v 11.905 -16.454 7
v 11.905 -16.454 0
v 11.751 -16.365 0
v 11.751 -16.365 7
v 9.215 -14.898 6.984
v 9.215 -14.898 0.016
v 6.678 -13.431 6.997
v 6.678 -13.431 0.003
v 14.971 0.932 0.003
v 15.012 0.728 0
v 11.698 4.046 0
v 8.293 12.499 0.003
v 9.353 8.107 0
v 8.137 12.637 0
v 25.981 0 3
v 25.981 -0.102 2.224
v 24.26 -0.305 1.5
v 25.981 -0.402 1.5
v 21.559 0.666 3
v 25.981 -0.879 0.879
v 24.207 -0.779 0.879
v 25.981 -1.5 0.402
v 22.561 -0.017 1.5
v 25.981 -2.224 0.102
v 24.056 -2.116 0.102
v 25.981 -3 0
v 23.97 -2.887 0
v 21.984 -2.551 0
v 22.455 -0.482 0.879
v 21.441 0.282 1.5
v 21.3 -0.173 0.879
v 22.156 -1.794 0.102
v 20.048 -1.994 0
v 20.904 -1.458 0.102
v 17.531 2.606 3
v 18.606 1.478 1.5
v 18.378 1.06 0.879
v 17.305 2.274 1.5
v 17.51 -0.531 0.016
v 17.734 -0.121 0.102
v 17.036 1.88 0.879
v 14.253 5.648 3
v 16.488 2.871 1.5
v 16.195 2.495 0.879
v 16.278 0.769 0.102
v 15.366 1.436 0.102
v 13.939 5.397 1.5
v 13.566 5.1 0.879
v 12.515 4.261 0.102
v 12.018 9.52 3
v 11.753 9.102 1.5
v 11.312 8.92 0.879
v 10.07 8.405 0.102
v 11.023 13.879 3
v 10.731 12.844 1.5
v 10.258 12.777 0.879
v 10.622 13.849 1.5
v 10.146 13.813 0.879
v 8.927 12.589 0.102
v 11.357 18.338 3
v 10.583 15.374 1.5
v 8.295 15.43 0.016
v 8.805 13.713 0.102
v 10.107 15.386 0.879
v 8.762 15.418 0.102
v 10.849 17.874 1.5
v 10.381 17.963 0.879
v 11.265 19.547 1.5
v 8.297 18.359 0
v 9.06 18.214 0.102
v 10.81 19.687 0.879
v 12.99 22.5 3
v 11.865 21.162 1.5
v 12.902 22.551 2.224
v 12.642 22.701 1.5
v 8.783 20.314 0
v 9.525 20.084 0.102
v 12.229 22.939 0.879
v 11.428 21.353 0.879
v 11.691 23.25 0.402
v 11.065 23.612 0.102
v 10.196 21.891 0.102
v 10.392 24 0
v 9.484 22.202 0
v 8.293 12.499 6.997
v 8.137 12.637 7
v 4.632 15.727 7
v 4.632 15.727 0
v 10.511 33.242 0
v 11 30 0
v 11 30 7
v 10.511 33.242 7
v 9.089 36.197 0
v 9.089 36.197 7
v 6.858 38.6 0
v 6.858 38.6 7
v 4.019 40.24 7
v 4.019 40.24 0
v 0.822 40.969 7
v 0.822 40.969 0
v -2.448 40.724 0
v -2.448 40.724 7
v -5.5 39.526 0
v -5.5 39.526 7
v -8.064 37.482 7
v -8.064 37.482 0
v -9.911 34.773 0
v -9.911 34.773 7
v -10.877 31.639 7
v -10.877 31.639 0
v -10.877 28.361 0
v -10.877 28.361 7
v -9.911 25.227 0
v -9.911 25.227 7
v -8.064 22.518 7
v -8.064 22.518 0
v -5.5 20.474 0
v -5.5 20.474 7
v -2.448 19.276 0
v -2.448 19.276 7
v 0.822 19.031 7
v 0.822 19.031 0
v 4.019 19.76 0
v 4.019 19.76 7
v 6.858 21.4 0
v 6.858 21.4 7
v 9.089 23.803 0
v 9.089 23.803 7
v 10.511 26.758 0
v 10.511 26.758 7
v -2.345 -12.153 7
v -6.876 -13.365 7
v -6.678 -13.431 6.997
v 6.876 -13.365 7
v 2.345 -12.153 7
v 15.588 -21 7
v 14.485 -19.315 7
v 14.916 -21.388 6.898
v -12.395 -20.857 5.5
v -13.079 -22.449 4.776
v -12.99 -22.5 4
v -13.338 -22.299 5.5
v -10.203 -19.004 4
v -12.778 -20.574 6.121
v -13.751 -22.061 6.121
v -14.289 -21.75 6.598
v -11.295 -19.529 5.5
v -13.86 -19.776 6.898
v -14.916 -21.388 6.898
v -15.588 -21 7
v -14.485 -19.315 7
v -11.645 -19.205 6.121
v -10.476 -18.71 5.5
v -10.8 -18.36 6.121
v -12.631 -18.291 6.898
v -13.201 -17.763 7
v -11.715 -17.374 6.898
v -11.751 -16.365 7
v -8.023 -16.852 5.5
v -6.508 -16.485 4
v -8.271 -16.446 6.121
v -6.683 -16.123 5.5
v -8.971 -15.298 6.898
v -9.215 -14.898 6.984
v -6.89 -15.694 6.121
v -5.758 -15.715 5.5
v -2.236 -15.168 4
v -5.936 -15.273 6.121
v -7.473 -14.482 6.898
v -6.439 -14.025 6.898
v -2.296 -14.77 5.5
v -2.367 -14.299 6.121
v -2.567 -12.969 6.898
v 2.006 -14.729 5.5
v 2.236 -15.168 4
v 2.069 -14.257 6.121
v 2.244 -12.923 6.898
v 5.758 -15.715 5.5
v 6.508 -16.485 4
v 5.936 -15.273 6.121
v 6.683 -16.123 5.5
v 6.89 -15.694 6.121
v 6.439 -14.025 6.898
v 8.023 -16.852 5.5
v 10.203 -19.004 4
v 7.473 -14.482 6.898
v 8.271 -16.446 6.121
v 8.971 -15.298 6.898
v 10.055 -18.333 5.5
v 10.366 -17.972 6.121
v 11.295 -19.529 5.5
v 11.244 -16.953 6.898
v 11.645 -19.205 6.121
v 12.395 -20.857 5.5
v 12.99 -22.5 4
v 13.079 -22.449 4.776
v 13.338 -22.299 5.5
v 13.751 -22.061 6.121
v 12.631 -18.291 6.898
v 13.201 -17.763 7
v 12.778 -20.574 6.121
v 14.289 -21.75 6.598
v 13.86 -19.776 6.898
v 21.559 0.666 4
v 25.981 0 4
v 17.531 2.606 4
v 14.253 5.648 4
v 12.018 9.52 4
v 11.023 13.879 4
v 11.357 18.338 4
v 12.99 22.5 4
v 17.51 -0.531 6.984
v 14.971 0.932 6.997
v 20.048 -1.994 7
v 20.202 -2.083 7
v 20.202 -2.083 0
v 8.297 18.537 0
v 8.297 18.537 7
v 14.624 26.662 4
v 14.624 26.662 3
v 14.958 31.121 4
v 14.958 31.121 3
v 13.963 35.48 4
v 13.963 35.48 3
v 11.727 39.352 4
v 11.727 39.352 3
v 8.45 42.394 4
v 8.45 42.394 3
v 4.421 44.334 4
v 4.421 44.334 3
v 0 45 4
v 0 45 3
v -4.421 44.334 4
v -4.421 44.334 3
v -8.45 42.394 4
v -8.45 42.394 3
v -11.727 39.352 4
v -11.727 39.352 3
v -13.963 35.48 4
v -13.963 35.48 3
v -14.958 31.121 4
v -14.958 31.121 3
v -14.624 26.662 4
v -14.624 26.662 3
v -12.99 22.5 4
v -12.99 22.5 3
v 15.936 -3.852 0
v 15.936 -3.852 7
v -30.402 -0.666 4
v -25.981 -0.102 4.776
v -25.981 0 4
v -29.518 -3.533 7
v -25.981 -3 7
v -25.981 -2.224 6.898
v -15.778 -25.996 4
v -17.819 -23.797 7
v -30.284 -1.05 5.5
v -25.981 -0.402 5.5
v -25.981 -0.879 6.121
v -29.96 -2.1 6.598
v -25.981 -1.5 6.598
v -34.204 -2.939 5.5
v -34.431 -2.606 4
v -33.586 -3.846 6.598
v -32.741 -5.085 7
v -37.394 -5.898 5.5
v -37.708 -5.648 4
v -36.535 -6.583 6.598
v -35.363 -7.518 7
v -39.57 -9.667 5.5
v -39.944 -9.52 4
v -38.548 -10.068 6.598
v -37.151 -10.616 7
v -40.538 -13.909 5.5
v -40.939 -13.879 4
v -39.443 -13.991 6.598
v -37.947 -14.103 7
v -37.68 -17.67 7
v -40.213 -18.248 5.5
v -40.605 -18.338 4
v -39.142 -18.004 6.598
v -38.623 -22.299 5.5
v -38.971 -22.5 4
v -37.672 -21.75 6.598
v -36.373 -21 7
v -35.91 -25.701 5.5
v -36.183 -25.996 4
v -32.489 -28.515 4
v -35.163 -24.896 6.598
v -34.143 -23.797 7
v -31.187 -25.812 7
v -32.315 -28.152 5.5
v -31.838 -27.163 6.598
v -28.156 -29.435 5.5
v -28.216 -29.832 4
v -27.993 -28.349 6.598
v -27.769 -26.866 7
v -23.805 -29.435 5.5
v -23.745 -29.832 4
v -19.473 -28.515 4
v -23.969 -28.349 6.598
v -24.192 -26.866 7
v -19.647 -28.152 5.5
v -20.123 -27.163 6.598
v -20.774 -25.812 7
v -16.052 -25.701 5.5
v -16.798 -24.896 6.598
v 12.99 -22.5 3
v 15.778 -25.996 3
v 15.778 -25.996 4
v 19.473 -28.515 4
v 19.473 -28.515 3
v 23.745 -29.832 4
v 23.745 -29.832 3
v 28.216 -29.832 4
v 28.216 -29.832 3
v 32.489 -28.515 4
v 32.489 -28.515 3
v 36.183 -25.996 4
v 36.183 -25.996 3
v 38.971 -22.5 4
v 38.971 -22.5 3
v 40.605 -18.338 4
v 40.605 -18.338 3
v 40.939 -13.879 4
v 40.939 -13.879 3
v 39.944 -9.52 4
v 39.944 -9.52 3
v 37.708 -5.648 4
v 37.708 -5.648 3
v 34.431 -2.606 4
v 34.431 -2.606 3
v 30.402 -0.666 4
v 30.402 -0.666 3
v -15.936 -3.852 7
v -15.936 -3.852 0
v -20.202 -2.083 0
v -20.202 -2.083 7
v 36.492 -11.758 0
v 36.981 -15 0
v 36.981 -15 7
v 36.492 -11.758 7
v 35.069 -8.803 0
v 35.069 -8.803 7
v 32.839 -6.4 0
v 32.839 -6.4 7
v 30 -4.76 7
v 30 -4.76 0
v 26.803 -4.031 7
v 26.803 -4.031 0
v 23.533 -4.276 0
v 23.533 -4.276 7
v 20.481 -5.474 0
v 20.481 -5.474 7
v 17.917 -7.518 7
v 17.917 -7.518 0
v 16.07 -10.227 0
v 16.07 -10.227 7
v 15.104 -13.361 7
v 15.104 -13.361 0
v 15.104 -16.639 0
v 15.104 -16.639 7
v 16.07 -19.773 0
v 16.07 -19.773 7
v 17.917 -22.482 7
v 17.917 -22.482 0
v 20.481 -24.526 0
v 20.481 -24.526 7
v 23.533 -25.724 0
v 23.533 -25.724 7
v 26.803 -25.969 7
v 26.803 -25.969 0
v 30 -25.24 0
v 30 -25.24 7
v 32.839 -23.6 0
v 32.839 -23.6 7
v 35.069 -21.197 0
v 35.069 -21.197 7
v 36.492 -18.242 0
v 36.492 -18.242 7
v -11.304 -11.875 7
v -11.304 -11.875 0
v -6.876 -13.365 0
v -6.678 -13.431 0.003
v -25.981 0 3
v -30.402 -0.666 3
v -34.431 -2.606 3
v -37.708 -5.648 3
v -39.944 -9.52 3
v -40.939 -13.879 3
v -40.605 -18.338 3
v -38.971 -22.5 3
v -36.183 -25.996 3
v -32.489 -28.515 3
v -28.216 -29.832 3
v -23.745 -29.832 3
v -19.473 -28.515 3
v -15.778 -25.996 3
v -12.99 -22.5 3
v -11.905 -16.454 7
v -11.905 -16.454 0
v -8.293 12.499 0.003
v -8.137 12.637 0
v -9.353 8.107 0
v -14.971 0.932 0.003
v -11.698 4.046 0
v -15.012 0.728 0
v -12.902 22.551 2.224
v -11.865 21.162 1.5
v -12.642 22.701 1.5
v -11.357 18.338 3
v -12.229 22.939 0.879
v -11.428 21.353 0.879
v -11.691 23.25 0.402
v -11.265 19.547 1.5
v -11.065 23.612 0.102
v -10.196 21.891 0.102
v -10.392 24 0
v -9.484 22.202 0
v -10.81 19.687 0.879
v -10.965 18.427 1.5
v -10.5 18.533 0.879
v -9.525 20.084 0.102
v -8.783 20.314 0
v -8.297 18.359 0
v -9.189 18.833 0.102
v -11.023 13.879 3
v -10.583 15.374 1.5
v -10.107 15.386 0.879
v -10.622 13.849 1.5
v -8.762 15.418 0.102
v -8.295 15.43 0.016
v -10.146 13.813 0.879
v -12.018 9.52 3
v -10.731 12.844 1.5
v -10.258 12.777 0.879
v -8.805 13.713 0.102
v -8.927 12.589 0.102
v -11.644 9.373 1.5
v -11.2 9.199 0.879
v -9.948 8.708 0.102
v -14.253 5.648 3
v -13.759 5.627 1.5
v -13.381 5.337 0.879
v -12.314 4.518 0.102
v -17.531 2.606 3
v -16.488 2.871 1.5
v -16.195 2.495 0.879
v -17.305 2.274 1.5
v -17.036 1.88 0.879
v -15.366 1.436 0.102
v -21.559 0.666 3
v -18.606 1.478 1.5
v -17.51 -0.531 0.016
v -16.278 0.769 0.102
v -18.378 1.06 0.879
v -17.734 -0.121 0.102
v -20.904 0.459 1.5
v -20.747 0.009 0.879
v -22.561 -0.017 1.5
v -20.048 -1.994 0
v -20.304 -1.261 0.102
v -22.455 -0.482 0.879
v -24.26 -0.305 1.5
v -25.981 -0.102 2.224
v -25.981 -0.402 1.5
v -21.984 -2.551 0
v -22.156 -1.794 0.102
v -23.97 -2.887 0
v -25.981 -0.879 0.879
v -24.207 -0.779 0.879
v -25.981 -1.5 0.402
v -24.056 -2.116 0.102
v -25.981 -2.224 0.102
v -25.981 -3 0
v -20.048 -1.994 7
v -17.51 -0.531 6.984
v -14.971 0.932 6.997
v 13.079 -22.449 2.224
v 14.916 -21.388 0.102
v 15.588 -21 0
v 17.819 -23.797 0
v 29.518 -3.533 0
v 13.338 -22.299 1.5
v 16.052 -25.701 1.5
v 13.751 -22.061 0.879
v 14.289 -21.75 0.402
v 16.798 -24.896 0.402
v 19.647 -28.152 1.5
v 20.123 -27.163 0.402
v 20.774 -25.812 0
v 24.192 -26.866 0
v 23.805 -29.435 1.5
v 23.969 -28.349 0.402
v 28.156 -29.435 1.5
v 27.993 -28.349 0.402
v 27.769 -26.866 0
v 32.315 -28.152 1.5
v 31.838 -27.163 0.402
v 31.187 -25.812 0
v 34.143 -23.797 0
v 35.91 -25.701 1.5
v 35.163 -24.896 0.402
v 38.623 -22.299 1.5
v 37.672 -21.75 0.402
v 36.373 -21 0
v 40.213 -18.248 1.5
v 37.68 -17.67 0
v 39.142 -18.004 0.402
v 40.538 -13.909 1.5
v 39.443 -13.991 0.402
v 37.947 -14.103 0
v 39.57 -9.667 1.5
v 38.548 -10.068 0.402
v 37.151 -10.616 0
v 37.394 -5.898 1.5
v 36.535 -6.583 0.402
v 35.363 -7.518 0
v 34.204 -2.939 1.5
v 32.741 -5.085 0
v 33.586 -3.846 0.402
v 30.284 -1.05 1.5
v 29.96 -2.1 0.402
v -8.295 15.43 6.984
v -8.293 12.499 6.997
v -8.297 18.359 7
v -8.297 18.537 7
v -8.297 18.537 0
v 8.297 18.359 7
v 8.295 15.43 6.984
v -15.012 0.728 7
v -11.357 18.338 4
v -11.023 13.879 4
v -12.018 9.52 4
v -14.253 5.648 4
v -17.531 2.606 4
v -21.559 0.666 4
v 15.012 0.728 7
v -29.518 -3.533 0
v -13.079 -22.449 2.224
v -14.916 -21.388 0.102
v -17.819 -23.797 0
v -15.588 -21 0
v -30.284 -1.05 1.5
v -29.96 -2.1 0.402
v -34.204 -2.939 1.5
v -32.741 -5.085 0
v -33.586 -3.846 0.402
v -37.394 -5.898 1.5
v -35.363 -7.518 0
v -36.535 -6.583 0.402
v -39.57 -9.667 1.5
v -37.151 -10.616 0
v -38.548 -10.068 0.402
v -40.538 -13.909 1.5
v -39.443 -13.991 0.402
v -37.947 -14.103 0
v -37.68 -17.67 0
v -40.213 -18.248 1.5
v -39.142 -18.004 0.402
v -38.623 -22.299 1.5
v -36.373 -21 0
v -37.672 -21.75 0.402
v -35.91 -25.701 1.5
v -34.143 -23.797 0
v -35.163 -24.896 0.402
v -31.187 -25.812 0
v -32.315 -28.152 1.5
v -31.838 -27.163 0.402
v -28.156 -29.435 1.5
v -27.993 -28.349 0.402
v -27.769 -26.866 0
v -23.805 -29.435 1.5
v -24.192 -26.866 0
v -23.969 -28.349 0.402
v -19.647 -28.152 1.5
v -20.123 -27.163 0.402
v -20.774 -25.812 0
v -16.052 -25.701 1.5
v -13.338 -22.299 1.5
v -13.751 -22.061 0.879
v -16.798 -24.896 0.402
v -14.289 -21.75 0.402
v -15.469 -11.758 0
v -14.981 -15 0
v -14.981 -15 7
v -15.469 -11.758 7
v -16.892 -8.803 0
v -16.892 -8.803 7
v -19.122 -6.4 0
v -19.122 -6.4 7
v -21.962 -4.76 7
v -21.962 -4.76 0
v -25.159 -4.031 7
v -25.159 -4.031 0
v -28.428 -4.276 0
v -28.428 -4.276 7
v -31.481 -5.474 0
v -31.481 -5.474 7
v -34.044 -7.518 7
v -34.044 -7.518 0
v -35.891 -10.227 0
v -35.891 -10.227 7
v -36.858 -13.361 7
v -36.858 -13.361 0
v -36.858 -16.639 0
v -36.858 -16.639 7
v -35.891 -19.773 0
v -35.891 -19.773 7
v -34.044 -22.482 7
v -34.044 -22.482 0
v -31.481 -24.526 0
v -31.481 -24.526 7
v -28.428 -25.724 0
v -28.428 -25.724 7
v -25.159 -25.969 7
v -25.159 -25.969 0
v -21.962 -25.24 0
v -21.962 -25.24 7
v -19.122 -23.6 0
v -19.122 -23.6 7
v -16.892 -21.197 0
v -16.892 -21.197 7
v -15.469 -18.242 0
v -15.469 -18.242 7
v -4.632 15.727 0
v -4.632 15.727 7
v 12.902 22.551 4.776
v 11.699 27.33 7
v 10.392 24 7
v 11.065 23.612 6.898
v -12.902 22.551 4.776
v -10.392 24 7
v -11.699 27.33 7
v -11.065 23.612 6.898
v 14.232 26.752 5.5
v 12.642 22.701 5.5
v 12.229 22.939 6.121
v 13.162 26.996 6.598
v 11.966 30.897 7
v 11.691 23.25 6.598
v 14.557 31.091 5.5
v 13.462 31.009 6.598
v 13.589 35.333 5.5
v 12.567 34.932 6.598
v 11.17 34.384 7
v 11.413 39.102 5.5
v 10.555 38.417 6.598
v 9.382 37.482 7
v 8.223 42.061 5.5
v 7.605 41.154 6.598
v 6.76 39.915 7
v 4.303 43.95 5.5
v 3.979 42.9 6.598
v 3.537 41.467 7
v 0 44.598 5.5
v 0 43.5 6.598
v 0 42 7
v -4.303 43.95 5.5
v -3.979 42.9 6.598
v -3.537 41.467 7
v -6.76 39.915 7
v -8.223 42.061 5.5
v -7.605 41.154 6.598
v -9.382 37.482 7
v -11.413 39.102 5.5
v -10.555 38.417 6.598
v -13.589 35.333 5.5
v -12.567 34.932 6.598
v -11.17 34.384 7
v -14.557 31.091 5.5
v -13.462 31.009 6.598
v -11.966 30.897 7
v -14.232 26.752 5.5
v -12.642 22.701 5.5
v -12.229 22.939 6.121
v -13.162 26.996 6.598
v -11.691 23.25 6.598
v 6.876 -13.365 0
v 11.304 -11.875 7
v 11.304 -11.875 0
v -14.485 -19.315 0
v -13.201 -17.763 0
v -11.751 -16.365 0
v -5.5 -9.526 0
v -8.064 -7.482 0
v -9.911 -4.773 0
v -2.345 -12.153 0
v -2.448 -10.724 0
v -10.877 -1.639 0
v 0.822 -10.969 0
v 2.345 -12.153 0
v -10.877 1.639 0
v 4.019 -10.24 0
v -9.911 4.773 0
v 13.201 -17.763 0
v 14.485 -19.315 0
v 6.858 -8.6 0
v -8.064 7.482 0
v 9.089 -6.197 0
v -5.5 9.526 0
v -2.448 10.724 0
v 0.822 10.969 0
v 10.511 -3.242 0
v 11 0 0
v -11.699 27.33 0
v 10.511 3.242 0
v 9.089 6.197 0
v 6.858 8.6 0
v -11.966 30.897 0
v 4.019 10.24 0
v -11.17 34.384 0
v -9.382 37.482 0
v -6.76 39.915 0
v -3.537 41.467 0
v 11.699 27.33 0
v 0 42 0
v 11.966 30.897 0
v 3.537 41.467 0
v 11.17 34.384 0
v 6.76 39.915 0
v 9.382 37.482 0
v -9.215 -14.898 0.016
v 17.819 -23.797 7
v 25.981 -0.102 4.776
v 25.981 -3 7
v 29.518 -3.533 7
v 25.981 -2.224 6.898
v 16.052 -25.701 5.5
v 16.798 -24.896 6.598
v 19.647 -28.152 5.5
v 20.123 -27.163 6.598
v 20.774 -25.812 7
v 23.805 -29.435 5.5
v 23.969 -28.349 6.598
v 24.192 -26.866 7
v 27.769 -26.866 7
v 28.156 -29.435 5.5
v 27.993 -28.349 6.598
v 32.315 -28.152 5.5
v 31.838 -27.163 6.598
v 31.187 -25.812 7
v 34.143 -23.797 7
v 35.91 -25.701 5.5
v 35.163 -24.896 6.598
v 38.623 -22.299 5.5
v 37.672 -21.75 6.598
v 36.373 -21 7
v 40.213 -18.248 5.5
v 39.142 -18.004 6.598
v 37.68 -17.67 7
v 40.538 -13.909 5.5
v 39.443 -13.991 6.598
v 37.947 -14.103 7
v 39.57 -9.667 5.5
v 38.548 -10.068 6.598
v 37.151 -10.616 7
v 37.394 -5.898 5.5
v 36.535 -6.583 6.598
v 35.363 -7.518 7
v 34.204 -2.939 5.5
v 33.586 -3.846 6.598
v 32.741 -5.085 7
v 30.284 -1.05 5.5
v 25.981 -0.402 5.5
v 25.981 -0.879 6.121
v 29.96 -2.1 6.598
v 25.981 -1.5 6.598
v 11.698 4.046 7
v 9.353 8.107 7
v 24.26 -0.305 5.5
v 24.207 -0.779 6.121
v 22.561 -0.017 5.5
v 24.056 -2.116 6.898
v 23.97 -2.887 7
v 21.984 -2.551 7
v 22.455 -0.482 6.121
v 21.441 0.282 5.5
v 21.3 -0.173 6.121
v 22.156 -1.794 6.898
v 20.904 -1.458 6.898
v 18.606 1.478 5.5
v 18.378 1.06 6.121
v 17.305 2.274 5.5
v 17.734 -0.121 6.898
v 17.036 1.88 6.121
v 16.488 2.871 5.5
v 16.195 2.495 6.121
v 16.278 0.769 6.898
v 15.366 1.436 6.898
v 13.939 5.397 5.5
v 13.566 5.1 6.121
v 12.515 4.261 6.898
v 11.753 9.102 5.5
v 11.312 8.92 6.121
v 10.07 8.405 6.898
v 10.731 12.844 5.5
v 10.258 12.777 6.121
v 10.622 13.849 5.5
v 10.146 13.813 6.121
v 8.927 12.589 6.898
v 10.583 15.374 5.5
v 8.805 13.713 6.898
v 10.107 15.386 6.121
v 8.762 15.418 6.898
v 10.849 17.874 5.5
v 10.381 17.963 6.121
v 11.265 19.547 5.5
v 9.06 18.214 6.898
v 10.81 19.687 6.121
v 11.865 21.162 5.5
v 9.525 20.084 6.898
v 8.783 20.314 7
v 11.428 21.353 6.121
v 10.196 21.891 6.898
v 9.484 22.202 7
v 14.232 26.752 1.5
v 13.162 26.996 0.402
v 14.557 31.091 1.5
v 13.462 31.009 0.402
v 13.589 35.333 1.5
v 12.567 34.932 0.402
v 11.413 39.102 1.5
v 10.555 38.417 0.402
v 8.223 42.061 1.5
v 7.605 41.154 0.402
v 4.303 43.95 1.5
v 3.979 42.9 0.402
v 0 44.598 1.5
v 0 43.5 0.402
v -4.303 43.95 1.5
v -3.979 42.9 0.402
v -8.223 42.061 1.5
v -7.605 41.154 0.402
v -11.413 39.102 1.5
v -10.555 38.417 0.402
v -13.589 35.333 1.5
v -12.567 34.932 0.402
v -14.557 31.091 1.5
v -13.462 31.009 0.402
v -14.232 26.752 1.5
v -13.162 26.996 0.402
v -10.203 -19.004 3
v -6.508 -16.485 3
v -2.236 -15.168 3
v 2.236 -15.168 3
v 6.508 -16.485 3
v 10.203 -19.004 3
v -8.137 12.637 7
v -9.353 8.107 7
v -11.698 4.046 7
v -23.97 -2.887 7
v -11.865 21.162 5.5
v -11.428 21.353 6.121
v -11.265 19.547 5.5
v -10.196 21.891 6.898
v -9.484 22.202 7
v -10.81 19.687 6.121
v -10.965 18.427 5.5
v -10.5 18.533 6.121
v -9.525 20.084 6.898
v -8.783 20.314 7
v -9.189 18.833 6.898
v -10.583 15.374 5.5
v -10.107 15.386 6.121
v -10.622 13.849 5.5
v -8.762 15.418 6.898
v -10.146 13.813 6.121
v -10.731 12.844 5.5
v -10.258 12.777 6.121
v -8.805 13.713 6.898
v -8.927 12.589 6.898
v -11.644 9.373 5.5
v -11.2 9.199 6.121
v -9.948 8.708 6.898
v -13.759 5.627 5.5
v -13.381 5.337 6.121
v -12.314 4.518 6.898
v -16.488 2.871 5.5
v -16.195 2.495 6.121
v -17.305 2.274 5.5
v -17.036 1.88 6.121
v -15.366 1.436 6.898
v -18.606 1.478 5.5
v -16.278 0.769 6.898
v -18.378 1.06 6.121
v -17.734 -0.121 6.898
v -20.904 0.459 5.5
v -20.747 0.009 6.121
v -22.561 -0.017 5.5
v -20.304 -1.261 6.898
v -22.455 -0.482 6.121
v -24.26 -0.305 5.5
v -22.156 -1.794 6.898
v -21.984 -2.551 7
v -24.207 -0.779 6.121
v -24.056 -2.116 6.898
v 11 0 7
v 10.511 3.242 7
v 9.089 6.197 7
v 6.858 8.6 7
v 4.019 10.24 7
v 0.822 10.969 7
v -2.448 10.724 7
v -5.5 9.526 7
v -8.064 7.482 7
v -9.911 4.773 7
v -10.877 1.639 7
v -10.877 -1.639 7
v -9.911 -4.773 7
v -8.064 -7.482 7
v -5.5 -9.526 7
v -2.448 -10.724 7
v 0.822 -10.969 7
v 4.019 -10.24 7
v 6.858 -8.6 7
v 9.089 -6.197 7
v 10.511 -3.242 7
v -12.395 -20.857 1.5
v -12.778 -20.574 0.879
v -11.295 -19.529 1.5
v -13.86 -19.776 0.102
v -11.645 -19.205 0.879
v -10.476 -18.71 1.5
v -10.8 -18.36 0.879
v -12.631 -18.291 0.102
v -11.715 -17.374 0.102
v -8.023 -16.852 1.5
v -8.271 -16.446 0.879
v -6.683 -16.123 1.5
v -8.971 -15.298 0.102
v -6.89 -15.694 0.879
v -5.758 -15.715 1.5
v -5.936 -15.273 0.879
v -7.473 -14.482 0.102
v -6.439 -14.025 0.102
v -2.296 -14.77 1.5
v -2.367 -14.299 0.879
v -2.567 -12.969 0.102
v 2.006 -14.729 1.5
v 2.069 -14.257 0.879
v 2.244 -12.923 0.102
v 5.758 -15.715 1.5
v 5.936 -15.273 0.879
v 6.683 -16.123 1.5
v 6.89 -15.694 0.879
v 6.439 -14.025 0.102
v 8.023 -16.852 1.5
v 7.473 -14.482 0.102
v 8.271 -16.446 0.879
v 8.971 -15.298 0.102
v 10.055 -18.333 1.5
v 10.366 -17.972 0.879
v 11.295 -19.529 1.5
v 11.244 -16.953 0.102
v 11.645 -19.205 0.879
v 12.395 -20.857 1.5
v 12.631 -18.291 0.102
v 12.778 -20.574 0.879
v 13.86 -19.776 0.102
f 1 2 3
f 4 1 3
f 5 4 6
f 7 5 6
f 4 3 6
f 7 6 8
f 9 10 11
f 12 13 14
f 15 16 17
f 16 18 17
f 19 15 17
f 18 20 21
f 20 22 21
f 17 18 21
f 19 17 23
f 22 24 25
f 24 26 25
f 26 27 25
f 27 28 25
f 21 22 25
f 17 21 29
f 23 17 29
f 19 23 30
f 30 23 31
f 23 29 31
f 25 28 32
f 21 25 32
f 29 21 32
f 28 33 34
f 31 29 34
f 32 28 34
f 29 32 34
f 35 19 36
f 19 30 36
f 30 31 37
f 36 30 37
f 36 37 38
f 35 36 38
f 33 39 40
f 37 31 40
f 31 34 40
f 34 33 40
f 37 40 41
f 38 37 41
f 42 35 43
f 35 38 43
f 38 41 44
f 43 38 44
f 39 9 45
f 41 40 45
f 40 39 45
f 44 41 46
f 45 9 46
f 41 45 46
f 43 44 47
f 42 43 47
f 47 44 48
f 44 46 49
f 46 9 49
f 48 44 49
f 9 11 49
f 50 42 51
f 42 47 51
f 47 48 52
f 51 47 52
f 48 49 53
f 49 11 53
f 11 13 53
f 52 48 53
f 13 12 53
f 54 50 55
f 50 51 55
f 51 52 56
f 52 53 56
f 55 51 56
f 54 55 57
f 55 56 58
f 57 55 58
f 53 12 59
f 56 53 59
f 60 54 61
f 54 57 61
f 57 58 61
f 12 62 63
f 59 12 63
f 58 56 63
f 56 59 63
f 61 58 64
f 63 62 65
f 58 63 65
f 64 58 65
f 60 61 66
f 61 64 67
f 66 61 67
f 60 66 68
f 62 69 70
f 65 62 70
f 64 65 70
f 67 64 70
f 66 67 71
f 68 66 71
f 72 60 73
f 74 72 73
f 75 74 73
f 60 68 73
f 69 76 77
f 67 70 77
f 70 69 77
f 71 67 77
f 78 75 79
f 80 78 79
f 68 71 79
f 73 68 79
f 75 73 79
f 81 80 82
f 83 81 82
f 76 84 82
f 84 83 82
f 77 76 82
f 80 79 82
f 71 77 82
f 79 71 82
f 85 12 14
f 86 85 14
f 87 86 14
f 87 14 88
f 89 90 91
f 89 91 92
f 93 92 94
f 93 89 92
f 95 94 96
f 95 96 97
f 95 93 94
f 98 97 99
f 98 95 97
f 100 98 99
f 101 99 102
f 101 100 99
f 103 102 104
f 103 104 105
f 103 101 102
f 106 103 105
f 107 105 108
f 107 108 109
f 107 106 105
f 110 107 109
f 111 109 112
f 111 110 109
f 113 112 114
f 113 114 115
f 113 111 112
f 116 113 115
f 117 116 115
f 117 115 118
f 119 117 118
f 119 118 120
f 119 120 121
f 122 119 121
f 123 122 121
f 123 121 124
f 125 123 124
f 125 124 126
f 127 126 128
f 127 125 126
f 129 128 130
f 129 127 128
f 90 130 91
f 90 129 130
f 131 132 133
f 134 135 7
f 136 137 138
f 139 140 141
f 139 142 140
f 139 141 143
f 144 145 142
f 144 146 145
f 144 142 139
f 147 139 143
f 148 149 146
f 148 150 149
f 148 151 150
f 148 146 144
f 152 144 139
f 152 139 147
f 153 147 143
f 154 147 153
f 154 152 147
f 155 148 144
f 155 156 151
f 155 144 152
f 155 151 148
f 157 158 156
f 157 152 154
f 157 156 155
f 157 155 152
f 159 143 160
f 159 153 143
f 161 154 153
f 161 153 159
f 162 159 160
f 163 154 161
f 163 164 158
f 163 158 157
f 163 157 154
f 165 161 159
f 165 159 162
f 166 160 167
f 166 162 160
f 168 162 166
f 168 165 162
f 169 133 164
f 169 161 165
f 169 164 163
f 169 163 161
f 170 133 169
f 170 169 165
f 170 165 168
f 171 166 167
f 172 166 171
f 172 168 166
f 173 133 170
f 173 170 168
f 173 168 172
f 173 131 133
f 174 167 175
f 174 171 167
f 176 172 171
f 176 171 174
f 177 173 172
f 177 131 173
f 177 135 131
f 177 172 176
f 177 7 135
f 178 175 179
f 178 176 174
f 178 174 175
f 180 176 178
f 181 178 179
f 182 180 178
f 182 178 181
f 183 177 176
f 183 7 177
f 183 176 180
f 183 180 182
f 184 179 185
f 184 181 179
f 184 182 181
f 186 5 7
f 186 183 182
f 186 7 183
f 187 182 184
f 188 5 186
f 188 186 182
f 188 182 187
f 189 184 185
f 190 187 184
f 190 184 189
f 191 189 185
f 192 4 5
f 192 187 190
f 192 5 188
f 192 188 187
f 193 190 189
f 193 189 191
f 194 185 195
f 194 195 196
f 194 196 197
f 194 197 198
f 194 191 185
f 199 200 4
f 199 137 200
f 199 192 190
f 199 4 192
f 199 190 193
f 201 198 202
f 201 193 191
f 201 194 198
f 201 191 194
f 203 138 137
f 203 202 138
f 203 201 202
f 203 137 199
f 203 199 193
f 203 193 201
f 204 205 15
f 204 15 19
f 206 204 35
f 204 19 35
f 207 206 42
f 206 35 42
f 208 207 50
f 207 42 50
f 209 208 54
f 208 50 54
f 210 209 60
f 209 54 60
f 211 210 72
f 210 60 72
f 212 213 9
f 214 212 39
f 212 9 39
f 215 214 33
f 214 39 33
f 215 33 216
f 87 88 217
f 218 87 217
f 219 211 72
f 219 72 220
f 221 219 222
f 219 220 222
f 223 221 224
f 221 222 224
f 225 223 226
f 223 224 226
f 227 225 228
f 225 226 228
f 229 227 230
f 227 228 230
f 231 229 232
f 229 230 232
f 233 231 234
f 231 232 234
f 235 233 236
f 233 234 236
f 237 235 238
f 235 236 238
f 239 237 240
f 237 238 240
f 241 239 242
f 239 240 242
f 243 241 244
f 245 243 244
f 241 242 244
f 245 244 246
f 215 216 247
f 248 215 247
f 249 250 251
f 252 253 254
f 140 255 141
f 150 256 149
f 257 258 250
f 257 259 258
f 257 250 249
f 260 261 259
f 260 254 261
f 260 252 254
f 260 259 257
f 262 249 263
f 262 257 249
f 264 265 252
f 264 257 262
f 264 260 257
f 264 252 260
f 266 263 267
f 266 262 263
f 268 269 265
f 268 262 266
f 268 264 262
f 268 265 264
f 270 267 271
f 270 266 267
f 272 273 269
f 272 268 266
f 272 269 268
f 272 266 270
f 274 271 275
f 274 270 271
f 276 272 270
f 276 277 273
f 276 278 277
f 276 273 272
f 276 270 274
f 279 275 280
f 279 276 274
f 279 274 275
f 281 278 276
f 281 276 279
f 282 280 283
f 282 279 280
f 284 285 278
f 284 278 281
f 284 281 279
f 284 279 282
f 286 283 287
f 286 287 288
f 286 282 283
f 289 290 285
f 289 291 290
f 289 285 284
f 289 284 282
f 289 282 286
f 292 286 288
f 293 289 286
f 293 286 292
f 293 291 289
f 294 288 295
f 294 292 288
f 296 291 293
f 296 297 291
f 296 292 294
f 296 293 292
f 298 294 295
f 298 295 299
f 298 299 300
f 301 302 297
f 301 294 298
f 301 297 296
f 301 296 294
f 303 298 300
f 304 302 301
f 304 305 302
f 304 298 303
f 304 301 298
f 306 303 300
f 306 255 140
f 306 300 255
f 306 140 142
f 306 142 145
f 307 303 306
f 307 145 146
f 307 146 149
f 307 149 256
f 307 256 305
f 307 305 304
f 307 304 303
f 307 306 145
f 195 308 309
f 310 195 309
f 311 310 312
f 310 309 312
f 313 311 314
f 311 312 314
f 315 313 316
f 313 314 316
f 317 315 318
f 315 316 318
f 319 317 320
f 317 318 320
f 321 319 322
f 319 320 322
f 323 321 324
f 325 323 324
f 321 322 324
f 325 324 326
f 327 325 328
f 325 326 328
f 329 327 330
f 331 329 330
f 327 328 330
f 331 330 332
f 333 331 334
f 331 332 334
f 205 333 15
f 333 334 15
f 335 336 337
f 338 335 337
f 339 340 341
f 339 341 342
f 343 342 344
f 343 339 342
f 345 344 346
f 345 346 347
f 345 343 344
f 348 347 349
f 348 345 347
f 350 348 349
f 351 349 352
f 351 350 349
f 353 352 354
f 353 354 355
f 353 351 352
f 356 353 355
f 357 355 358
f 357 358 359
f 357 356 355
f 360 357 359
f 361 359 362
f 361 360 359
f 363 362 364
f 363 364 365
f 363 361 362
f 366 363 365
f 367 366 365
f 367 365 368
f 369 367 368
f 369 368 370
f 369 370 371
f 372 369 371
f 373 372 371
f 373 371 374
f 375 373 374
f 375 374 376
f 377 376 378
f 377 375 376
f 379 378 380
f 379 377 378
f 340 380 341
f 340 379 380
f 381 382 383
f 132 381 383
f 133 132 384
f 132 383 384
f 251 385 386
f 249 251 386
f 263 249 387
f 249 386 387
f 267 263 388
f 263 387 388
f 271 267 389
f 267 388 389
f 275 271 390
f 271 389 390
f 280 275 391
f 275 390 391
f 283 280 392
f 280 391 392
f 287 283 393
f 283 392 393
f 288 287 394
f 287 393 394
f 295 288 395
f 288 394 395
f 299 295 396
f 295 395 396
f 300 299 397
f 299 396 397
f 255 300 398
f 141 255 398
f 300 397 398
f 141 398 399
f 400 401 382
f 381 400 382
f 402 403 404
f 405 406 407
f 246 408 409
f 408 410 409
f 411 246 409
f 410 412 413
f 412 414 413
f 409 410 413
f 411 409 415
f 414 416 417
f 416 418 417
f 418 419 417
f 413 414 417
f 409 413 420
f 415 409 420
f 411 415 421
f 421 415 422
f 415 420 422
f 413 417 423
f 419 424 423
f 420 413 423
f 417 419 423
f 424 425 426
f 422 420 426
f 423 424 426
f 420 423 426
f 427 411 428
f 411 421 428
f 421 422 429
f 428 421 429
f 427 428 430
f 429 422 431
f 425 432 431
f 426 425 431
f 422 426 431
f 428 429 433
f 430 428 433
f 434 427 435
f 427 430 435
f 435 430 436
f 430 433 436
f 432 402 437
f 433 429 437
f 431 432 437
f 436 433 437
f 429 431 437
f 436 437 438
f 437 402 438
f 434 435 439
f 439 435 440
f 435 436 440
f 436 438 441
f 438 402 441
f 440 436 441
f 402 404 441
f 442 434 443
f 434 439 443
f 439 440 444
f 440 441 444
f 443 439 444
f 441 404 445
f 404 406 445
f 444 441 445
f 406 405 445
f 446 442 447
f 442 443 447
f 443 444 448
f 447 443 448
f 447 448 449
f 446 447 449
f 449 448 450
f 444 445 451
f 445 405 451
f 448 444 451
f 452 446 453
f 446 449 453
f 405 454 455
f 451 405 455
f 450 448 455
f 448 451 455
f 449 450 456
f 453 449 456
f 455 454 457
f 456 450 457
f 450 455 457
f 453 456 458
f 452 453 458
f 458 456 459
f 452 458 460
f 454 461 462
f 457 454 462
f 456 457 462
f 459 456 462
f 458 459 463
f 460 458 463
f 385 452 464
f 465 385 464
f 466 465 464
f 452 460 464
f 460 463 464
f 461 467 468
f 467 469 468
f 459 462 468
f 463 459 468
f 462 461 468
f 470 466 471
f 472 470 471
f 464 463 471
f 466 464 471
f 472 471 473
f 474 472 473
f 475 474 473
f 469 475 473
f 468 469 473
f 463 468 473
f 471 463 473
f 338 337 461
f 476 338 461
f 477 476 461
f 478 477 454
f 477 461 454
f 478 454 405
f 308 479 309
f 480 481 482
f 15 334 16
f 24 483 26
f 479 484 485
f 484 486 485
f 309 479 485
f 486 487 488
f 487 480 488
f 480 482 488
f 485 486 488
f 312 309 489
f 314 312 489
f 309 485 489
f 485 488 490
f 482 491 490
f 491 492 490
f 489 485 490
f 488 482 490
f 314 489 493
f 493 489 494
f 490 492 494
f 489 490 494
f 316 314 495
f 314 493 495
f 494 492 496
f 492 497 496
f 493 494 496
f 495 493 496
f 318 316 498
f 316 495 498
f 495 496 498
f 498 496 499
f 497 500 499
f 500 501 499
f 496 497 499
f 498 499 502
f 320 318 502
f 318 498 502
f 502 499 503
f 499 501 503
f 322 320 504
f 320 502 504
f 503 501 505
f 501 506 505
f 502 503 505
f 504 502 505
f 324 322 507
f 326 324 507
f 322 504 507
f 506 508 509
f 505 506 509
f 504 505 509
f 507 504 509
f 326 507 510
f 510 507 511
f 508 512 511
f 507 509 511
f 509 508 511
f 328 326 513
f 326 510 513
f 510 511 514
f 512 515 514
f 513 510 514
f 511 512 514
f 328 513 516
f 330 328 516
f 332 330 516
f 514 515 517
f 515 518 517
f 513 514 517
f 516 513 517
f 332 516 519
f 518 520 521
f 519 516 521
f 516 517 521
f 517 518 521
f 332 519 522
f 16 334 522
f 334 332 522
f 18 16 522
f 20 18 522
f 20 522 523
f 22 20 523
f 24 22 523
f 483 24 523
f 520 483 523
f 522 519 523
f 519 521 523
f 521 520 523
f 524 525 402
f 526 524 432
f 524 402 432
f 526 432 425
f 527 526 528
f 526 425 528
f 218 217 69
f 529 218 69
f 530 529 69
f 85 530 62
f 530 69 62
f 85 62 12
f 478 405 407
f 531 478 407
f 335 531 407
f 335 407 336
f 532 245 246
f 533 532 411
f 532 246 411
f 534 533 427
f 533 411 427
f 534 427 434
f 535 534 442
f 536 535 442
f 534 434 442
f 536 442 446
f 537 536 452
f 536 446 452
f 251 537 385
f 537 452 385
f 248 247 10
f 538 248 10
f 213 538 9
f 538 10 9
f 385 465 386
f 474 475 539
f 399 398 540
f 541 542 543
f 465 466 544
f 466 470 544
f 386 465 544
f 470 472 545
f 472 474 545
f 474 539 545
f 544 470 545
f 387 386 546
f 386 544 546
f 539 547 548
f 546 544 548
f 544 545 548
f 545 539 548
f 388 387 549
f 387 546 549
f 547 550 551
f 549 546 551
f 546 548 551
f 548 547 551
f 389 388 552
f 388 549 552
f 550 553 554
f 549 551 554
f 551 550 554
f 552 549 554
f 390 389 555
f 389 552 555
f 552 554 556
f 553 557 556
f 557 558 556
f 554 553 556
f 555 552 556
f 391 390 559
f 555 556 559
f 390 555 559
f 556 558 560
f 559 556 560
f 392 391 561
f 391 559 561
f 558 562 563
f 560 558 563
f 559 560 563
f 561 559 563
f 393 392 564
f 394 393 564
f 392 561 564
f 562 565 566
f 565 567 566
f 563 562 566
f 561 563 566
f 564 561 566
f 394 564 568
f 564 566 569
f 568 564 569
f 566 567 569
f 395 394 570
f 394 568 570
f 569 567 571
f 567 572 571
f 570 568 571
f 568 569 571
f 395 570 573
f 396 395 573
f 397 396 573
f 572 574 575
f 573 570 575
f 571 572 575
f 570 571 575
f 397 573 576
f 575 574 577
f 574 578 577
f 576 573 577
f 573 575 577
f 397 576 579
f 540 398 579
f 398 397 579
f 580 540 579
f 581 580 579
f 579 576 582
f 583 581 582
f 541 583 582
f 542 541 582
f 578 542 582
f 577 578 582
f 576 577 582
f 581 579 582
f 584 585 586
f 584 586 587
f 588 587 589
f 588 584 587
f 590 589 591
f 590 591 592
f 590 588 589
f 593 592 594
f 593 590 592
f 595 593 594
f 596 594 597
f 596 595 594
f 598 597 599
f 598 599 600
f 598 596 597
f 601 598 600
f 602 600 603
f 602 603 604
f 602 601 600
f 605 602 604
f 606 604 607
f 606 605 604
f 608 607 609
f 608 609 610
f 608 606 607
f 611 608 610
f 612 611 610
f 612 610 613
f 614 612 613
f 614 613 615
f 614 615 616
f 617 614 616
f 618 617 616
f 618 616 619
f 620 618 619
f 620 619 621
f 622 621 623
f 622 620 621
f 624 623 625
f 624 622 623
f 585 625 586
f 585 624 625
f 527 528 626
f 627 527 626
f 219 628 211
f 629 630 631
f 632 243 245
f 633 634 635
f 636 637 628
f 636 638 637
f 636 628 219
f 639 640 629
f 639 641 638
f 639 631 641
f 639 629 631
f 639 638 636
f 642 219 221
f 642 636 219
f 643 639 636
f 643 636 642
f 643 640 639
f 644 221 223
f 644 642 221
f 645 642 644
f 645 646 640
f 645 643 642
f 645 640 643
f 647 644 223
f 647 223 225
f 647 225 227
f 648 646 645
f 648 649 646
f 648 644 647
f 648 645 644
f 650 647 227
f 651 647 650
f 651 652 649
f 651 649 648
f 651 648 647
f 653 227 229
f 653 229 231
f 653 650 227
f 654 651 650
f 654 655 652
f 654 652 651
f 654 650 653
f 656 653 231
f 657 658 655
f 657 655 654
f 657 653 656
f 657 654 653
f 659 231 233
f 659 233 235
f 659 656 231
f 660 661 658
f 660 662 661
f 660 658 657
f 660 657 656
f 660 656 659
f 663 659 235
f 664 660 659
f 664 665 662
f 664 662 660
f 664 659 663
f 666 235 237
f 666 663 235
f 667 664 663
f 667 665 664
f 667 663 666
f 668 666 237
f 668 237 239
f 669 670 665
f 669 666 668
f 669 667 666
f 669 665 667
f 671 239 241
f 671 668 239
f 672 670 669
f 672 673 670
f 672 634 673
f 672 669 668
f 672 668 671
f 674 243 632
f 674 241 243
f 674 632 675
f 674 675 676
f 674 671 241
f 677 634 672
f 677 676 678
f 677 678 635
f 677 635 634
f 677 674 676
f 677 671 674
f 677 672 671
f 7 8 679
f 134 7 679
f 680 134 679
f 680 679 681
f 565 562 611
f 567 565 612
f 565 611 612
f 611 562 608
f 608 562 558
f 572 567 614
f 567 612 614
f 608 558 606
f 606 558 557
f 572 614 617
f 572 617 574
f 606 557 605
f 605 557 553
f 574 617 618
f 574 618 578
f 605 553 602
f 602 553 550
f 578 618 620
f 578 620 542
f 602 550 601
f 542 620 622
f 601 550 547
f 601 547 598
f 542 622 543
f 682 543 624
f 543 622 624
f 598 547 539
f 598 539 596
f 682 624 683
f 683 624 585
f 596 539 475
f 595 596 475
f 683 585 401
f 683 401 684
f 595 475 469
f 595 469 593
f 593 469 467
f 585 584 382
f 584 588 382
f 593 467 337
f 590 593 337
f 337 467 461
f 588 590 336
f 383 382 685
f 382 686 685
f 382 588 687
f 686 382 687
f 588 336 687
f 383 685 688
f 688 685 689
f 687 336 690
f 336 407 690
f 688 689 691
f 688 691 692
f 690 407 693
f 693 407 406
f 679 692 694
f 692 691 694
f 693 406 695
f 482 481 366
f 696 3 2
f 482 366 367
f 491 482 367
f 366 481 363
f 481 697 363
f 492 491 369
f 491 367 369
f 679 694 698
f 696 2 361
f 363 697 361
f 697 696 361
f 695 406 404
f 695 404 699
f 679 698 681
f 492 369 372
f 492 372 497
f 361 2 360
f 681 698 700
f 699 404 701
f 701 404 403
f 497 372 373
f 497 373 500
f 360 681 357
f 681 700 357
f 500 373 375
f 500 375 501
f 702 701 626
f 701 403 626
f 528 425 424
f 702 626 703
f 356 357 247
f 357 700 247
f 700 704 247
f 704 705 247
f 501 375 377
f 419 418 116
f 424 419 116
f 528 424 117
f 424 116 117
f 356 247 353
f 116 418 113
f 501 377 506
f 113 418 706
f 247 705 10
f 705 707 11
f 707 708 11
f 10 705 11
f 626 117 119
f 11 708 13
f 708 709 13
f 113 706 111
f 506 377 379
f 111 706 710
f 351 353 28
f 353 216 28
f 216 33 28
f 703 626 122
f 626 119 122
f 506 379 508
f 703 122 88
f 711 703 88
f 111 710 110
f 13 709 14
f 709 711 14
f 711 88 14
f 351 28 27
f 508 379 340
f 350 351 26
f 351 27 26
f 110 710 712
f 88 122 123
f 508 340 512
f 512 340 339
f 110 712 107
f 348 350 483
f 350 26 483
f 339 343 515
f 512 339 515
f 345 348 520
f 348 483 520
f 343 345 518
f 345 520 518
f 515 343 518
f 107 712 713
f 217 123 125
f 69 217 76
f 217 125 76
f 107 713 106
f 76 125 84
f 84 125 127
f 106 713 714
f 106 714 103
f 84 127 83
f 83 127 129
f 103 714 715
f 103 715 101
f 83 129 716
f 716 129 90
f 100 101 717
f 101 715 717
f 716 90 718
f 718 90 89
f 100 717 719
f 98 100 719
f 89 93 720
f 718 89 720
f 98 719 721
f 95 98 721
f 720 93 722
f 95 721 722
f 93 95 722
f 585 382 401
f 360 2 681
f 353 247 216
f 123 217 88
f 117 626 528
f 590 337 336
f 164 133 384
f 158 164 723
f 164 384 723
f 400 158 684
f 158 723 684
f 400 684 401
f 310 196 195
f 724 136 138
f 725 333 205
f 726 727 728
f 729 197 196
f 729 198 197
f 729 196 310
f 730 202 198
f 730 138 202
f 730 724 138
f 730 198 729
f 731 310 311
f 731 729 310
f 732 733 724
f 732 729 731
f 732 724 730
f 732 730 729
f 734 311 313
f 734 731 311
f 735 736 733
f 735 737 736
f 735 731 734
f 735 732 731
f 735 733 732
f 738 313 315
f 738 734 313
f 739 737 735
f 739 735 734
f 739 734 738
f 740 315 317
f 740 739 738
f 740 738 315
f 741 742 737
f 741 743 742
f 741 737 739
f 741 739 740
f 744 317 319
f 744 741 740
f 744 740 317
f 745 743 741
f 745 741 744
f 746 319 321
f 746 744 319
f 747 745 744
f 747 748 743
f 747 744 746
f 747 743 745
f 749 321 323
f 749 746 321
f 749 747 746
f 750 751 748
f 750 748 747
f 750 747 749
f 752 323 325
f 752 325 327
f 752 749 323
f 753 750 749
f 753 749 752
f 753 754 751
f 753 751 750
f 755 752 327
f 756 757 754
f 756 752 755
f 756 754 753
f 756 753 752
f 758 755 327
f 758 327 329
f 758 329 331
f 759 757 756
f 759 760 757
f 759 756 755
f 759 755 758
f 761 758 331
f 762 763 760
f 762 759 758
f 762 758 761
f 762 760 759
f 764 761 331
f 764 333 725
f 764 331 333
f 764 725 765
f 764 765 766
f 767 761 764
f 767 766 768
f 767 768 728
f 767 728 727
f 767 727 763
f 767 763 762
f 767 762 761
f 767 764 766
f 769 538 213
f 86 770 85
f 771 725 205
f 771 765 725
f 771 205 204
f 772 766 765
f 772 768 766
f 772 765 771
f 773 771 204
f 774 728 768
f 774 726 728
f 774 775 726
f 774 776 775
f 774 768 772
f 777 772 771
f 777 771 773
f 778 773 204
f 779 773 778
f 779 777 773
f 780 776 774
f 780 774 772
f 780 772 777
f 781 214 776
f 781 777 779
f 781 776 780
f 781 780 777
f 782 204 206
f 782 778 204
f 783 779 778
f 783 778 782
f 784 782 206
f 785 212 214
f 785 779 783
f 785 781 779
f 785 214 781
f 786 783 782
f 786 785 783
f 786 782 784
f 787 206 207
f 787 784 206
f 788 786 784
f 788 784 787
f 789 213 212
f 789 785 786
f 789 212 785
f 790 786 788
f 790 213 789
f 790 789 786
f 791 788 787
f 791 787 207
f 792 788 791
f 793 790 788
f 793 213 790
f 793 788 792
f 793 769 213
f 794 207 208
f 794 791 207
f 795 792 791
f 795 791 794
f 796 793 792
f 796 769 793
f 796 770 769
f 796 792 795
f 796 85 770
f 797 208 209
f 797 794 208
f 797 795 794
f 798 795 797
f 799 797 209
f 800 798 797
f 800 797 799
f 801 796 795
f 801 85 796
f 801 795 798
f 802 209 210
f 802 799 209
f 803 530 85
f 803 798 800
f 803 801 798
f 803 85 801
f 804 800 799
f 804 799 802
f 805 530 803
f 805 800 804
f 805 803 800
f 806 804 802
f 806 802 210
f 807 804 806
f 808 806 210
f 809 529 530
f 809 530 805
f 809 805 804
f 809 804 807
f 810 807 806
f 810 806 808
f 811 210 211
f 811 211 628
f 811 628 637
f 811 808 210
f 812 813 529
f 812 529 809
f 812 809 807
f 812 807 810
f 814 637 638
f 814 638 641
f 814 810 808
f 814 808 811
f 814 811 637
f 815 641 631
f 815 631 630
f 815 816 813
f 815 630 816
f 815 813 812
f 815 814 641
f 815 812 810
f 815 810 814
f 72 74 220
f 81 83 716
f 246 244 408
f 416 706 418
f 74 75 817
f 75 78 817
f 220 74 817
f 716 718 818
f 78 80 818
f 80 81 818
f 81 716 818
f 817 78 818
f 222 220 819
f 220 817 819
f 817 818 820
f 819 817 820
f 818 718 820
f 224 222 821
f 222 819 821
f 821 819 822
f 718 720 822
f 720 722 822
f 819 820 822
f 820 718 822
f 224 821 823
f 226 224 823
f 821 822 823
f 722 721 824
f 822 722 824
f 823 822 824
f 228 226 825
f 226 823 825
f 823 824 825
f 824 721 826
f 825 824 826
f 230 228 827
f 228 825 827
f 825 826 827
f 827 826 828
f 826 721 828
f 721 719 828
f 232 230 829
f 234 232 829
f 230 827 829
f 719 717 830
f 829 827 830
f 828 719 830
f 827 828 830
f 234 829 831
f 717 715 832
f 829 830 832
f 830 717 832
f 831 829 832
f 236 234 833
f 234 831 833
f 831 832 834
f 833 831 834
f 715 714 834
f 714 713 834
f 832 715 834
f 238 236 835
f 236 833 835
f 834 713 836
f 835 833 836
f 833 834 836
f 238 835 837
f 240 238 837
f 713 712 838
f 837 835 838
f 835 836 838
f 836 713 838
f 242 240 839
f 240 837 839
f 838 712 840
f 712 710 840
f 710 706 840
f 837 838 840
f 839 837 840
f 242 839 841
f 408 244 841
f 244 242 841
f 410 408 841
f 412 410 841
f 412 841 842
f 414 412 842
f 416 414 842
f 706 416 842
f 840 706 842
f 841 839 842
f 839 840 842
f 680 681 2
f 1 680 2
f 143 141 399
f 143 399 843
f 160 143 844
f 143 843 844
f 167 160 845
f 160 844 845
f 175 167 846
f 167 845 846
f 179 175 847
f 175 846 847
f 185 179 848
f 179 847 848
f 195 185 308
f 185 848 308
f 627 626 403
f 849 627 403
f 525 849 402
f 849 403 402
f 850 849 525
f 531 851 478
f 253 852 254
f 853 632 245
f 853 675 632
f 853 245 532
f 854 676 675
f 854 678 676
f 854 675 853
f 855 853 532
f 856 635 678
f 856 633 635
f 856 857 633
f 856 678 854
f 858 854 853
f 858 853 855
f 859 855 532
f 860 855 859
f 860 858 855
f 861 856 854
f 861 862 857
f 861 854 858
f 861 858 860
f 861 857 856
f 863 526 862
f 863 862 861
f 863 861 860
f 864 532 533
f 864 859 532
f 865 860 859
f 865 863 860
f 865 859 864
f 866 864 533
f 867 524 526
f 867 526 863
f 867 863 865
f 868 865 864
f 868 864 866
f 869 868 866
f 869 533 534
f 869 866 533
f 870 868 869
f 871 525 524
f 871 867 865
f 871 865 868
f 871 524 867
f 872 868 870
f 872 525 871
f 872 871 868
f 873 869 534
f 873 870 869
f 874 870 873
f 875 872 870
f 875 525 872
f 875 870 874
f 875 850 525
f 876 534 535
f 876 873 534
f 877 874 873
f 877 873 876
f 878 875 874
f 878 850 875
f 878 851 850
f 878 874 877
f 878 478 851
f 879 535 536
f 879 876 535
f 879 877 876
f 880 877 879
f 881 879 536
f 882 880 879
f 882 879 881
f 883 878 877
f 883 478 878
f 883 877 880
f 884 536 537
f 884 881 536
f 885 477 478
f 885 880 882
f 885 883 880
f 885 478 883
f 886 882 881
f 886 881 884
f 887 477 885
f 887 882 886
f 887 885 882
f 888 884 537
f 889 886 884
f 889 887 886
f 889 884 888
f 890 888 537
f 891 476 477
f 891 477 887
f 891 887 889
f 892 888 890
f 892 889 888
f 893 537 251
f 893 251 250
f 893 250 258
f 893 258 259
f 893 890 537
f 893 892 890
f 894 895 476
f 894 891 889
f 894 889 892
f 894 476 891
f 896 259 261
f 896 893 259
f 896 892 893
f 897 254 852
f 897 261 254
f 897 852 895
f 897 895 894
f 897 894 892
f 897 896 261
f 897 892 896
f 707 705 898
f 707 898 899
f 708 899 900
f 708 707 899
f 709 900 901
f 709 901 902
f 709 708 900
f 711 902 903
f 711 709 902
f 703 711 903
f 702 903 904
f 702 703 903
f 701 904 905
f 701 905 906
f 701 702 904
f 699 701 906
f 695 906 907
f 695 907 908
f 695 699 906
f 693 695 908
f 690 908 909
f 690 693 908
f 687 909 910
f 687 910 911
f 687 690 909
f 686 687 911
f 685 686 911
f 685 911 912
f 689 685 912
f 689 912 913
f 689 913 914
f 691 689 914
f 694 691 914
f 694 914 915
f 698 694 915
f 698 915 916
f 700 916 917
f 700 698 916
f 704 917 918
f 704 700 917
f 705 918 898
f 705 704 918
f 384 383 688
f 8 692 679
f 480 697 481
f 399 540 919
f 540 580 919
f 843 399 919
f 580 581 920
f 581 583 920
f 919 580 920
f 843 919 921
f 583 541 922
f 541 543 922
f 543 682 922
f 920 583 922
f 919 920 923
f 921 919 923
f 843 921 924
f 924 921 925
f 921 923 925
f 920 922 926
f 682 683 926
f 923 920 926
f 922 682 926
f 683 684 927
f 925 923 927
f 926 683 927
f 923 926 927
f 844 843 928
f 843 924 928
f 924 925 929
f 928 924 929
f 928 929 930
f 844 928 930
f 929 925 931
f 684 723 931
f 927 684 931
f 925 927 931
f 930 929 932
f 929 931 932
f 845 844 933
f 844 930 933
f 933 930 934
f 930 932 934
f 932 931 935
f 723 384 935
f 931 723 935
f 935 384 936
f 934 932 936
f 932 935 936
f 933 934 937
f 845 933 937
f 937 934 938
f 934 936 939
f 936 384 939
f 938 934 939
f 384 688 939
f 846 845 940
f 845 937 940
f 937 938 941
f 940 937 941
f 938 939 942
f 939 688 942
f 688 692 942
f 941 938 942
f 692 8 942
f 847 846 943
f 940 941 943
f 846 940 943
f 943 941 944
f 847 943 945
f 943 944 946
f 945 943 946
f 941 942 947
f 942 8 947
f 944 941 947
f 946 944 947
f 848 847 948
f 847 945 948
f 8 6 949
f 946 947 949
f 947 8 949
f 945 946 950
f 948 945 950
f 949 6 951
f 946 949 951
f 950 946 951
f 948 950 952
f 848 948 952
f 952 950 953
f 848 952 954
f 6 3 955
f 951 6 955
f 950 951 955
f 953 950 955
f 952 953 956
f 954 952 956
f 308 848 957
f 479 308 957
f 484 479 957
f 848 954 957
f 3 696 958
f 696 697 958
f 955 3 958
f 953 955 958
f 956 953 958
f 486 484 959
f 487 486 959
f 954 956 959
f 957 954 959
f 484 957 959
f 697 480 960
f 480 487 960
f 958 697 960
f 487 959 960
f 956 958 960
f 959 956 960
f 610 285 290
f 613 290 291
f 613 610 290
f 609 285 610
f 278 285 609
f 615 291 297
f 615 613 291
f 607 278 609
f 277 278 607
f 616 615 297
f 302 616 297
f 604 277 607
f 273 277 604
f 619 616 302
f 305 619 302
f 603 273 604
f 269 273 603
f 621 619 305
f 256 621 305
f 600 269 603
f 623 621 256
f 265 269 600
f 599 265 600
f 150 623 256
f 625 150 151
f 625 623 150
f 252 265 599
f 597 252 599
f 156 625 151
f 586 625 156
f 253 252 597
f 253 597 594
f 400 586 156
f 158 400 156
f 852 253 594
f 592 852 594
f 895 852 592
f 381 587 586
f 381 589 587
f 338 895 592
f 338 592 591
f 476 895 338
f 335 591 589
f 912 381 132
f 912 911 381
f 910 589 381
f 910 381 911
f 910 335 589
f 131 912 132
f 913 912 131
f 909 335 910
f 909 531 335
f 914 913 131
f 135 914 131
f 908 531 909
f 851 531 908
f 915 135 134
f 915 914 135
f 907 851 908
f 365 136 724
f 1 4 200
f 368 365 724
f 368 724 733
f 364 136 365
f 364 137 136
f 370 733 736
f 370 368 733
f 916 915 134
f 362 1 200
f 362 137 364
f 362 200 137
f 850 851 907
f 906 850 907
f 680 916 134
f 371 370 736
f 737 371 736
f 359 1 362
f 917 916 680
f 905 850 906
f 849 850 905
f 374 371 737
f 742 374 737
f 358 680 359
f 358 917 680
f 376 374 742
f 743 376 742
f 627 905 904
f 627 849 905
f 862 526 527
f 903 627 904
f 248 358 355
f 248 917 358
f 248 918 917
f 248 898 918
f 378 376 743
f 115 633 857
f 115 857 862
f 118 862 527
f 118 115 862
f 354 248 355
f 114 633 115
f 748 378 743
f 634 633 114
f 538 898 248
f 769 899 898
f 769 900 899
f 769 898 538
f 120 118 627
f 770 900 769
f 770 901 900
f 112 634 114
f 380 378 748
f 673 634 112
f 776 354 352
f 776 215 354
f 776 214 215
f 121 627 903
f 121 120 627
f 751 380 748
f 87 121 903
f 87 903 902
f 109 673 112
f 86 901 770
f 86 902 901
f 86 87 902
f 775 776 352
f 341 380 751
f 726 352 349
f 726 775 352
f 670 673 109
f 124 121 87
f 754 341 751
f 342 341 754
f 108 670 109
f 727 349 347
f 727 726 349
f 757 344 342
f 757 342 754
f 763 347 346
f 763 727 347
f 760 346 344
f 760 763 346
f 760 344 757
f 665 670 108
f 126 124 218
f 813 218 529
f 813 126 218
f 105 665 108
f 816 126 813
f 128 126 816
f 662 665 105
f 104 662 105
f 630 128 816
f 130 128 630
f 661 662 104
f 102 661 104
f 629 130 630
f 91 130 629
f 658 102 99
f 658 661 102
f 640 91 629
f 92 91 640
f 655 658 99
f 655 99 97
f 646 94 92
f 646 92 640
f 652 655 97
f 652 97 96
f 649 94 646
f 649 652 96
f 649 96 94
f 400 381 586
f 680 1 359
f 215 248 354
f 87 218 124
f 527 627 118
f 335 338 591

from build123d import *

# Parameters (mm, degrees)
F0_R         = 11
F1_DEPTH     = 7
F2_T2_ANGLE  = 120
F2_T4_ANGLE  = 240
F2_T6_ANGLE  = 120
F2_T8_ANGLE  = 120
F2_T10_ANGLE = 240
F2_T12_ANGLE = 120
F2_T14_ANGLE = 240
F2_T16_ANGLE = 240
F2_T18_ANGLE = 120
F2_T20_ANGLE = 240
F2_T22_ANGLE = 120
F2_T24_ANGLE = 240


# Not quite as in the source:
# - a fillet or chamfer that OpenCascade refuses, or shapes differently, is made with other operations: its cross-section is extruded or revolved along the edge and cut away or added


with BuildPart() as f1:
    # F0 (on Top) → F1 (new body)
    with BuildSketch(Plane.XY):
        with BuildLine():
            ThreePointArc((25.9807621135, 0), (12.9903810568, 7.5), (12.9903810568, 22.5))
            ThreePointArc((12.9903810568, 22.5), (0, 45), (-12.9903810568, 22.5))
            ThreePointArc((-12.9903810568, 22.5), (-12.9903810568, 7.5), (-25.9807621135, 0))
            ThreePointArc((-25.9807621135, 0), (-38.9711431703, -22.5), (-12.9903810568, -22.5))
            ThreePointArc((-12.9903810568, -22.5), (0, -15), (12.9903810568, -22.5))
            ThreePointArc((12.9903810568, -22.5), (38.9711431703, -22.5), (25.9807621135, 0))
        make_face()
        with Locations((-25.9807621135, -15)):
            Circle(F0_R, mode=Mode.SUBTRACT)
        Polygon((-11.9048568753, -16.4538883806), (-11.3039139792, -11.8745555474), (-6.6782863332, -13.4313250148), align=None, mode=Mode.SUBTRACT)
        Polygon((-14.9710118359, 0.9320968891), (-15.9356237523, -3.8521988945), (-20.2019137663, -2.0829642921), align=None, mode=Mode.SUBTRACT)
        Polygon((6.6782863332, -13.4313250148), (11.3039139792, -11.8745555474), (11.9048568753, -16.4538883806), align=None, mode=Mode.SUBTRACT)
        with Locations((25.9807621135, -15)):
            Circle(F0_R, mode=Mode.SUBTRACT)
        Circle(F0_R, mode=Mode.SUBTRACT)
        Polygon((15.9356237523, -3.8521988945), (14.9710118359, 0.9320968891), (20.2019137663, -2.0829642921), align=None, mode=Mode.SUBTRACT)
        Polygon((-8.2927255027, 12.4992281257), (-8.297056891, 18.5368526727), (-4.6317097731, 15.7267544419), align=None, mode=Mode.SUBTRACT)
        Polygon((4.6317097731, 15.7267544419), (8.297056891, 18.5368526727), (8.2927255027, 12.4992281257), align=None, mode=Mode.SUBTRACT)
        with Locations((0, 30)):
            Circle(F0_R, mode=Mode.SUBTRACT)
    extrude(amount=F1_DEPTH)

    # F2: fillet of radius 3 on 12 edges, made by hand

    # F2_s1 → F2_t2 (revolve, cut)
    with BuildSketch(Plane(origin=(-12.9903810568, 22.5, 0), x_dir=(0, 0, 1), z_dir=(-0.5, 0.8660254038, 0))):
        with BuildLine():
            ThreePointArc((4, 0), (6.1213203436, 0.8786796564), (7, 3))
            Line((7, 3), (7, 0))
            Line((7, 0), (4, 0))
        make_face()
    revolve(axis=Axis((-25.9807621135, 15, 7), (0, 0, -1)), revolution_arc=F2_T2_ANGLE, mode=Mode.SUBTRACT)

    # F2_s3 → F2_t4 (revolve, cut)
    with BuildSketch(Plane(origin=(12.9903810568, 22.5, 0), x_dir=(0, 0, 1), z_dir=(-0.5, -0.8660254038, 0))):
        with BuildLine():
            ThreePointArc((4, 0), (6.1213203436, 0.8786796564), (7, 3))
            Line((7, 3), (7, 0))
            Line((7, 0), (4, 0))
        make_face()
    revolve(axis=Axis((0, 30, 7), (0, 0, 1)), revolution_arc=F2_T4_ANGLE, mode=Mode.SUBTRACT)

    # F2_s5 → F2_t6 (revolve, cut)
    with BuildSketch(Plane.YZ.offset(25.9807621135)):
        with BuildLine():
            ThreePointArc((0, 3), (-0.8786796564, 0.8786796564), (-3, 0))
            Line((-3, 0), (0, 0))
            Line((0, 0), (0, 3))
        make_face()
    revolve(axis=Axis((25.9807621135, 15, 0), (0, 0, -1)), revolution_arc=F2_T6_ANGLE, mode=Mode.SUBTRACT)

    # F2_s7 → F2_t8 (revolve, cut)
    with BuildSketch(Plane.YZ.offset(25.9807621135)):
        with BuildLine():
            ThreePointArc((0, 4), (-0.8786796564, 6.1213203436), (-3, 7))
            Line((-3, 7), (0, 7))
            Line((0, 7), (0, 4))
        make_face()
    revolve(axis=Axis((25.9807621135, 15, 7), (0, 0, -1)), revolution_arc=F2_T8_ANGLE, mode=Mode.SUBTRACT)

    # F2_s9 → F2_t10 (revolve, cut)
    with BuildSketch(Plane(origin=(12.9903810568, -22.5, 0), x_dir=(0, 0, 1), z_dir=(-0.5, 0.8660254038, 0))):
        with BuildLine():
            ThreePointArc((4, 0), (6.1213203436, 0.8786796564), (7, 3))
            Line((7, 3), (7, 0))
            Line((7, 0), (4, 0))
        make_face()
    revolve(axis=Axis((25.9807621135, -15, 7), (0, 0, 1)), revolution_arc=F2_T10_ANGLE, mode=Mode.SUBTRACT)

    # F2_s11 → F2_t12 (revolve, cut)
    with BuildSketch(Plane(origin=(-12.9903810568, -22.5, 0), x_dir=(0, 0, 1), z_dir=(-0.5, -0.8660254038, 0))):
        with BuildLine():
            ThreePointArc((4, 0), (6.1213203436, 0.8786796564), (7, 3))
            Line((7, 3), (7, 0))
            Line((7, 0), (4, 0))
        make_face()
    revolve(axis=Axis((0, -30, 7), (0, 0, -1)), revolution_arc=F2_T12_ANGLE, mode=Mode.SUBTRACT)

    # F2_s13 → F2_t14 (revolve, cut)
    with BuildSketch(Plane.YZ.offset(-25.9807621135)):
        with BuildLine():
            ThreePointArc((0, 4), (-0.8786796564, 6.1213203436), (-3, 7))
            Line((-3, 7), (0, 7))
            Line((0, 7), (0, 4))
        make_face()
    revolve(axis=Axis((-25.9807621135, -15, 7), (0, 0, 1)), revolution_arc=F2_T14_ANGLE, mode=Mode.SUBTRACT)

    # F2_s15 → F2_t16 (revolve, cut)
    with BuildSketch(Plane(origin=(12.9903810568, 22.5, 0), x_dir=(0, 0, 1), z_dir=(-0.5, -0.8660254038, 0))):
        with BuildLine():
            ThreePointArc((3, 0), (0.8786796564, 0.8786796564), (0, 3))
            Line((0, 3), (0, 0))
            Line((0, 0), (3, 0))
        make_face()
    revolve(axis=Axis((0, 30, 0), (0, 0, 1)), revolution_arc=F2_T16_ANGLE, mode=Mode.SUBTRACT)

    # F2_s17 → F2_t18 (revolve, cut)
    with BuildSketch(Plane(origin=(-12.9903810568, 22.5, 0), x_dir=(0, 0, 1), z_dir=(-0.5, 0.8660254038, 0))):
        with BuildLine():
            ThreePointArc((3, 0), (0.8786796564, 0.8786796564), (0, 3))
            Line((0, 3), (0, 0))
            Line((0, 0), (3, 0))
        make_face()
    revolve(axis=Axis((-25.9807621135, 15, 0), (0, 0, -1)), revolution_arc=F2_T18_ANGLE, mode=Mode.SUBTRACT)

    # F2_s19 → F2_t20 (revolve, cut)
    with BuildSketch(Plane.YZ.offset(-25.9807621135)):
        with BuildLine():
            ThreePointArc((0, 3), (-0.8786796564, 0.8786796564), (-3, 0))
            Line((-3, 0), (0, 0))
            Line((0, 0), (0, 3))
        make_face()
    revolve(axis=Axis((-25.9807621135, -15, 0), (0, 0, 1)), revolution_arc=F2_T20_ANGLE, mode=Mode.SUBTRACT)

    # F2_s21 → F2_t22 (revolve, cut)
    with BuildSketch(Plane(origin=(-12.9903810568, -22.5, 0), x_dir=(0, 0, 1), z_dir=(-0.5, -0.8660254038, 0))):
        with BuildLine():
            ThreePointArc((3, 0), (0.8786796564, 0.8786796564), (0, 3))
            Line((0, 3), (0, 0))
            Line((0, 0), (3, 0))
        make_face()
    revolve(axis=Axis((0, -30, 0), (0, 0, -1)), revolution_arc=F2_T22_ANGLE, mode=Mode.SUBTRACT)

    # F2_s23 → F2_t24 (revolve, cut)
    with BuildSketch(Plane(origin=(12.9903810568, -22.5, 0), x_dir=(0, 0, 1), z_dir=(-0.5, 0.8660254038, 0))):
        with BuildLine():
            ThreePointArc((3, 0), (0.8786796564, 0.8786796564), (0, 3))
            Line((0, 3), (0, 0))
            Line((0, 0), (3, 0))
        make_face()
    revolve(axis=Axis((25.9807621135, -15, 0), (0, 0, 1)), revolution_arc=F2_T24_ANGLE, mode=Mode.SUBTRACT)


solid = f1.part
